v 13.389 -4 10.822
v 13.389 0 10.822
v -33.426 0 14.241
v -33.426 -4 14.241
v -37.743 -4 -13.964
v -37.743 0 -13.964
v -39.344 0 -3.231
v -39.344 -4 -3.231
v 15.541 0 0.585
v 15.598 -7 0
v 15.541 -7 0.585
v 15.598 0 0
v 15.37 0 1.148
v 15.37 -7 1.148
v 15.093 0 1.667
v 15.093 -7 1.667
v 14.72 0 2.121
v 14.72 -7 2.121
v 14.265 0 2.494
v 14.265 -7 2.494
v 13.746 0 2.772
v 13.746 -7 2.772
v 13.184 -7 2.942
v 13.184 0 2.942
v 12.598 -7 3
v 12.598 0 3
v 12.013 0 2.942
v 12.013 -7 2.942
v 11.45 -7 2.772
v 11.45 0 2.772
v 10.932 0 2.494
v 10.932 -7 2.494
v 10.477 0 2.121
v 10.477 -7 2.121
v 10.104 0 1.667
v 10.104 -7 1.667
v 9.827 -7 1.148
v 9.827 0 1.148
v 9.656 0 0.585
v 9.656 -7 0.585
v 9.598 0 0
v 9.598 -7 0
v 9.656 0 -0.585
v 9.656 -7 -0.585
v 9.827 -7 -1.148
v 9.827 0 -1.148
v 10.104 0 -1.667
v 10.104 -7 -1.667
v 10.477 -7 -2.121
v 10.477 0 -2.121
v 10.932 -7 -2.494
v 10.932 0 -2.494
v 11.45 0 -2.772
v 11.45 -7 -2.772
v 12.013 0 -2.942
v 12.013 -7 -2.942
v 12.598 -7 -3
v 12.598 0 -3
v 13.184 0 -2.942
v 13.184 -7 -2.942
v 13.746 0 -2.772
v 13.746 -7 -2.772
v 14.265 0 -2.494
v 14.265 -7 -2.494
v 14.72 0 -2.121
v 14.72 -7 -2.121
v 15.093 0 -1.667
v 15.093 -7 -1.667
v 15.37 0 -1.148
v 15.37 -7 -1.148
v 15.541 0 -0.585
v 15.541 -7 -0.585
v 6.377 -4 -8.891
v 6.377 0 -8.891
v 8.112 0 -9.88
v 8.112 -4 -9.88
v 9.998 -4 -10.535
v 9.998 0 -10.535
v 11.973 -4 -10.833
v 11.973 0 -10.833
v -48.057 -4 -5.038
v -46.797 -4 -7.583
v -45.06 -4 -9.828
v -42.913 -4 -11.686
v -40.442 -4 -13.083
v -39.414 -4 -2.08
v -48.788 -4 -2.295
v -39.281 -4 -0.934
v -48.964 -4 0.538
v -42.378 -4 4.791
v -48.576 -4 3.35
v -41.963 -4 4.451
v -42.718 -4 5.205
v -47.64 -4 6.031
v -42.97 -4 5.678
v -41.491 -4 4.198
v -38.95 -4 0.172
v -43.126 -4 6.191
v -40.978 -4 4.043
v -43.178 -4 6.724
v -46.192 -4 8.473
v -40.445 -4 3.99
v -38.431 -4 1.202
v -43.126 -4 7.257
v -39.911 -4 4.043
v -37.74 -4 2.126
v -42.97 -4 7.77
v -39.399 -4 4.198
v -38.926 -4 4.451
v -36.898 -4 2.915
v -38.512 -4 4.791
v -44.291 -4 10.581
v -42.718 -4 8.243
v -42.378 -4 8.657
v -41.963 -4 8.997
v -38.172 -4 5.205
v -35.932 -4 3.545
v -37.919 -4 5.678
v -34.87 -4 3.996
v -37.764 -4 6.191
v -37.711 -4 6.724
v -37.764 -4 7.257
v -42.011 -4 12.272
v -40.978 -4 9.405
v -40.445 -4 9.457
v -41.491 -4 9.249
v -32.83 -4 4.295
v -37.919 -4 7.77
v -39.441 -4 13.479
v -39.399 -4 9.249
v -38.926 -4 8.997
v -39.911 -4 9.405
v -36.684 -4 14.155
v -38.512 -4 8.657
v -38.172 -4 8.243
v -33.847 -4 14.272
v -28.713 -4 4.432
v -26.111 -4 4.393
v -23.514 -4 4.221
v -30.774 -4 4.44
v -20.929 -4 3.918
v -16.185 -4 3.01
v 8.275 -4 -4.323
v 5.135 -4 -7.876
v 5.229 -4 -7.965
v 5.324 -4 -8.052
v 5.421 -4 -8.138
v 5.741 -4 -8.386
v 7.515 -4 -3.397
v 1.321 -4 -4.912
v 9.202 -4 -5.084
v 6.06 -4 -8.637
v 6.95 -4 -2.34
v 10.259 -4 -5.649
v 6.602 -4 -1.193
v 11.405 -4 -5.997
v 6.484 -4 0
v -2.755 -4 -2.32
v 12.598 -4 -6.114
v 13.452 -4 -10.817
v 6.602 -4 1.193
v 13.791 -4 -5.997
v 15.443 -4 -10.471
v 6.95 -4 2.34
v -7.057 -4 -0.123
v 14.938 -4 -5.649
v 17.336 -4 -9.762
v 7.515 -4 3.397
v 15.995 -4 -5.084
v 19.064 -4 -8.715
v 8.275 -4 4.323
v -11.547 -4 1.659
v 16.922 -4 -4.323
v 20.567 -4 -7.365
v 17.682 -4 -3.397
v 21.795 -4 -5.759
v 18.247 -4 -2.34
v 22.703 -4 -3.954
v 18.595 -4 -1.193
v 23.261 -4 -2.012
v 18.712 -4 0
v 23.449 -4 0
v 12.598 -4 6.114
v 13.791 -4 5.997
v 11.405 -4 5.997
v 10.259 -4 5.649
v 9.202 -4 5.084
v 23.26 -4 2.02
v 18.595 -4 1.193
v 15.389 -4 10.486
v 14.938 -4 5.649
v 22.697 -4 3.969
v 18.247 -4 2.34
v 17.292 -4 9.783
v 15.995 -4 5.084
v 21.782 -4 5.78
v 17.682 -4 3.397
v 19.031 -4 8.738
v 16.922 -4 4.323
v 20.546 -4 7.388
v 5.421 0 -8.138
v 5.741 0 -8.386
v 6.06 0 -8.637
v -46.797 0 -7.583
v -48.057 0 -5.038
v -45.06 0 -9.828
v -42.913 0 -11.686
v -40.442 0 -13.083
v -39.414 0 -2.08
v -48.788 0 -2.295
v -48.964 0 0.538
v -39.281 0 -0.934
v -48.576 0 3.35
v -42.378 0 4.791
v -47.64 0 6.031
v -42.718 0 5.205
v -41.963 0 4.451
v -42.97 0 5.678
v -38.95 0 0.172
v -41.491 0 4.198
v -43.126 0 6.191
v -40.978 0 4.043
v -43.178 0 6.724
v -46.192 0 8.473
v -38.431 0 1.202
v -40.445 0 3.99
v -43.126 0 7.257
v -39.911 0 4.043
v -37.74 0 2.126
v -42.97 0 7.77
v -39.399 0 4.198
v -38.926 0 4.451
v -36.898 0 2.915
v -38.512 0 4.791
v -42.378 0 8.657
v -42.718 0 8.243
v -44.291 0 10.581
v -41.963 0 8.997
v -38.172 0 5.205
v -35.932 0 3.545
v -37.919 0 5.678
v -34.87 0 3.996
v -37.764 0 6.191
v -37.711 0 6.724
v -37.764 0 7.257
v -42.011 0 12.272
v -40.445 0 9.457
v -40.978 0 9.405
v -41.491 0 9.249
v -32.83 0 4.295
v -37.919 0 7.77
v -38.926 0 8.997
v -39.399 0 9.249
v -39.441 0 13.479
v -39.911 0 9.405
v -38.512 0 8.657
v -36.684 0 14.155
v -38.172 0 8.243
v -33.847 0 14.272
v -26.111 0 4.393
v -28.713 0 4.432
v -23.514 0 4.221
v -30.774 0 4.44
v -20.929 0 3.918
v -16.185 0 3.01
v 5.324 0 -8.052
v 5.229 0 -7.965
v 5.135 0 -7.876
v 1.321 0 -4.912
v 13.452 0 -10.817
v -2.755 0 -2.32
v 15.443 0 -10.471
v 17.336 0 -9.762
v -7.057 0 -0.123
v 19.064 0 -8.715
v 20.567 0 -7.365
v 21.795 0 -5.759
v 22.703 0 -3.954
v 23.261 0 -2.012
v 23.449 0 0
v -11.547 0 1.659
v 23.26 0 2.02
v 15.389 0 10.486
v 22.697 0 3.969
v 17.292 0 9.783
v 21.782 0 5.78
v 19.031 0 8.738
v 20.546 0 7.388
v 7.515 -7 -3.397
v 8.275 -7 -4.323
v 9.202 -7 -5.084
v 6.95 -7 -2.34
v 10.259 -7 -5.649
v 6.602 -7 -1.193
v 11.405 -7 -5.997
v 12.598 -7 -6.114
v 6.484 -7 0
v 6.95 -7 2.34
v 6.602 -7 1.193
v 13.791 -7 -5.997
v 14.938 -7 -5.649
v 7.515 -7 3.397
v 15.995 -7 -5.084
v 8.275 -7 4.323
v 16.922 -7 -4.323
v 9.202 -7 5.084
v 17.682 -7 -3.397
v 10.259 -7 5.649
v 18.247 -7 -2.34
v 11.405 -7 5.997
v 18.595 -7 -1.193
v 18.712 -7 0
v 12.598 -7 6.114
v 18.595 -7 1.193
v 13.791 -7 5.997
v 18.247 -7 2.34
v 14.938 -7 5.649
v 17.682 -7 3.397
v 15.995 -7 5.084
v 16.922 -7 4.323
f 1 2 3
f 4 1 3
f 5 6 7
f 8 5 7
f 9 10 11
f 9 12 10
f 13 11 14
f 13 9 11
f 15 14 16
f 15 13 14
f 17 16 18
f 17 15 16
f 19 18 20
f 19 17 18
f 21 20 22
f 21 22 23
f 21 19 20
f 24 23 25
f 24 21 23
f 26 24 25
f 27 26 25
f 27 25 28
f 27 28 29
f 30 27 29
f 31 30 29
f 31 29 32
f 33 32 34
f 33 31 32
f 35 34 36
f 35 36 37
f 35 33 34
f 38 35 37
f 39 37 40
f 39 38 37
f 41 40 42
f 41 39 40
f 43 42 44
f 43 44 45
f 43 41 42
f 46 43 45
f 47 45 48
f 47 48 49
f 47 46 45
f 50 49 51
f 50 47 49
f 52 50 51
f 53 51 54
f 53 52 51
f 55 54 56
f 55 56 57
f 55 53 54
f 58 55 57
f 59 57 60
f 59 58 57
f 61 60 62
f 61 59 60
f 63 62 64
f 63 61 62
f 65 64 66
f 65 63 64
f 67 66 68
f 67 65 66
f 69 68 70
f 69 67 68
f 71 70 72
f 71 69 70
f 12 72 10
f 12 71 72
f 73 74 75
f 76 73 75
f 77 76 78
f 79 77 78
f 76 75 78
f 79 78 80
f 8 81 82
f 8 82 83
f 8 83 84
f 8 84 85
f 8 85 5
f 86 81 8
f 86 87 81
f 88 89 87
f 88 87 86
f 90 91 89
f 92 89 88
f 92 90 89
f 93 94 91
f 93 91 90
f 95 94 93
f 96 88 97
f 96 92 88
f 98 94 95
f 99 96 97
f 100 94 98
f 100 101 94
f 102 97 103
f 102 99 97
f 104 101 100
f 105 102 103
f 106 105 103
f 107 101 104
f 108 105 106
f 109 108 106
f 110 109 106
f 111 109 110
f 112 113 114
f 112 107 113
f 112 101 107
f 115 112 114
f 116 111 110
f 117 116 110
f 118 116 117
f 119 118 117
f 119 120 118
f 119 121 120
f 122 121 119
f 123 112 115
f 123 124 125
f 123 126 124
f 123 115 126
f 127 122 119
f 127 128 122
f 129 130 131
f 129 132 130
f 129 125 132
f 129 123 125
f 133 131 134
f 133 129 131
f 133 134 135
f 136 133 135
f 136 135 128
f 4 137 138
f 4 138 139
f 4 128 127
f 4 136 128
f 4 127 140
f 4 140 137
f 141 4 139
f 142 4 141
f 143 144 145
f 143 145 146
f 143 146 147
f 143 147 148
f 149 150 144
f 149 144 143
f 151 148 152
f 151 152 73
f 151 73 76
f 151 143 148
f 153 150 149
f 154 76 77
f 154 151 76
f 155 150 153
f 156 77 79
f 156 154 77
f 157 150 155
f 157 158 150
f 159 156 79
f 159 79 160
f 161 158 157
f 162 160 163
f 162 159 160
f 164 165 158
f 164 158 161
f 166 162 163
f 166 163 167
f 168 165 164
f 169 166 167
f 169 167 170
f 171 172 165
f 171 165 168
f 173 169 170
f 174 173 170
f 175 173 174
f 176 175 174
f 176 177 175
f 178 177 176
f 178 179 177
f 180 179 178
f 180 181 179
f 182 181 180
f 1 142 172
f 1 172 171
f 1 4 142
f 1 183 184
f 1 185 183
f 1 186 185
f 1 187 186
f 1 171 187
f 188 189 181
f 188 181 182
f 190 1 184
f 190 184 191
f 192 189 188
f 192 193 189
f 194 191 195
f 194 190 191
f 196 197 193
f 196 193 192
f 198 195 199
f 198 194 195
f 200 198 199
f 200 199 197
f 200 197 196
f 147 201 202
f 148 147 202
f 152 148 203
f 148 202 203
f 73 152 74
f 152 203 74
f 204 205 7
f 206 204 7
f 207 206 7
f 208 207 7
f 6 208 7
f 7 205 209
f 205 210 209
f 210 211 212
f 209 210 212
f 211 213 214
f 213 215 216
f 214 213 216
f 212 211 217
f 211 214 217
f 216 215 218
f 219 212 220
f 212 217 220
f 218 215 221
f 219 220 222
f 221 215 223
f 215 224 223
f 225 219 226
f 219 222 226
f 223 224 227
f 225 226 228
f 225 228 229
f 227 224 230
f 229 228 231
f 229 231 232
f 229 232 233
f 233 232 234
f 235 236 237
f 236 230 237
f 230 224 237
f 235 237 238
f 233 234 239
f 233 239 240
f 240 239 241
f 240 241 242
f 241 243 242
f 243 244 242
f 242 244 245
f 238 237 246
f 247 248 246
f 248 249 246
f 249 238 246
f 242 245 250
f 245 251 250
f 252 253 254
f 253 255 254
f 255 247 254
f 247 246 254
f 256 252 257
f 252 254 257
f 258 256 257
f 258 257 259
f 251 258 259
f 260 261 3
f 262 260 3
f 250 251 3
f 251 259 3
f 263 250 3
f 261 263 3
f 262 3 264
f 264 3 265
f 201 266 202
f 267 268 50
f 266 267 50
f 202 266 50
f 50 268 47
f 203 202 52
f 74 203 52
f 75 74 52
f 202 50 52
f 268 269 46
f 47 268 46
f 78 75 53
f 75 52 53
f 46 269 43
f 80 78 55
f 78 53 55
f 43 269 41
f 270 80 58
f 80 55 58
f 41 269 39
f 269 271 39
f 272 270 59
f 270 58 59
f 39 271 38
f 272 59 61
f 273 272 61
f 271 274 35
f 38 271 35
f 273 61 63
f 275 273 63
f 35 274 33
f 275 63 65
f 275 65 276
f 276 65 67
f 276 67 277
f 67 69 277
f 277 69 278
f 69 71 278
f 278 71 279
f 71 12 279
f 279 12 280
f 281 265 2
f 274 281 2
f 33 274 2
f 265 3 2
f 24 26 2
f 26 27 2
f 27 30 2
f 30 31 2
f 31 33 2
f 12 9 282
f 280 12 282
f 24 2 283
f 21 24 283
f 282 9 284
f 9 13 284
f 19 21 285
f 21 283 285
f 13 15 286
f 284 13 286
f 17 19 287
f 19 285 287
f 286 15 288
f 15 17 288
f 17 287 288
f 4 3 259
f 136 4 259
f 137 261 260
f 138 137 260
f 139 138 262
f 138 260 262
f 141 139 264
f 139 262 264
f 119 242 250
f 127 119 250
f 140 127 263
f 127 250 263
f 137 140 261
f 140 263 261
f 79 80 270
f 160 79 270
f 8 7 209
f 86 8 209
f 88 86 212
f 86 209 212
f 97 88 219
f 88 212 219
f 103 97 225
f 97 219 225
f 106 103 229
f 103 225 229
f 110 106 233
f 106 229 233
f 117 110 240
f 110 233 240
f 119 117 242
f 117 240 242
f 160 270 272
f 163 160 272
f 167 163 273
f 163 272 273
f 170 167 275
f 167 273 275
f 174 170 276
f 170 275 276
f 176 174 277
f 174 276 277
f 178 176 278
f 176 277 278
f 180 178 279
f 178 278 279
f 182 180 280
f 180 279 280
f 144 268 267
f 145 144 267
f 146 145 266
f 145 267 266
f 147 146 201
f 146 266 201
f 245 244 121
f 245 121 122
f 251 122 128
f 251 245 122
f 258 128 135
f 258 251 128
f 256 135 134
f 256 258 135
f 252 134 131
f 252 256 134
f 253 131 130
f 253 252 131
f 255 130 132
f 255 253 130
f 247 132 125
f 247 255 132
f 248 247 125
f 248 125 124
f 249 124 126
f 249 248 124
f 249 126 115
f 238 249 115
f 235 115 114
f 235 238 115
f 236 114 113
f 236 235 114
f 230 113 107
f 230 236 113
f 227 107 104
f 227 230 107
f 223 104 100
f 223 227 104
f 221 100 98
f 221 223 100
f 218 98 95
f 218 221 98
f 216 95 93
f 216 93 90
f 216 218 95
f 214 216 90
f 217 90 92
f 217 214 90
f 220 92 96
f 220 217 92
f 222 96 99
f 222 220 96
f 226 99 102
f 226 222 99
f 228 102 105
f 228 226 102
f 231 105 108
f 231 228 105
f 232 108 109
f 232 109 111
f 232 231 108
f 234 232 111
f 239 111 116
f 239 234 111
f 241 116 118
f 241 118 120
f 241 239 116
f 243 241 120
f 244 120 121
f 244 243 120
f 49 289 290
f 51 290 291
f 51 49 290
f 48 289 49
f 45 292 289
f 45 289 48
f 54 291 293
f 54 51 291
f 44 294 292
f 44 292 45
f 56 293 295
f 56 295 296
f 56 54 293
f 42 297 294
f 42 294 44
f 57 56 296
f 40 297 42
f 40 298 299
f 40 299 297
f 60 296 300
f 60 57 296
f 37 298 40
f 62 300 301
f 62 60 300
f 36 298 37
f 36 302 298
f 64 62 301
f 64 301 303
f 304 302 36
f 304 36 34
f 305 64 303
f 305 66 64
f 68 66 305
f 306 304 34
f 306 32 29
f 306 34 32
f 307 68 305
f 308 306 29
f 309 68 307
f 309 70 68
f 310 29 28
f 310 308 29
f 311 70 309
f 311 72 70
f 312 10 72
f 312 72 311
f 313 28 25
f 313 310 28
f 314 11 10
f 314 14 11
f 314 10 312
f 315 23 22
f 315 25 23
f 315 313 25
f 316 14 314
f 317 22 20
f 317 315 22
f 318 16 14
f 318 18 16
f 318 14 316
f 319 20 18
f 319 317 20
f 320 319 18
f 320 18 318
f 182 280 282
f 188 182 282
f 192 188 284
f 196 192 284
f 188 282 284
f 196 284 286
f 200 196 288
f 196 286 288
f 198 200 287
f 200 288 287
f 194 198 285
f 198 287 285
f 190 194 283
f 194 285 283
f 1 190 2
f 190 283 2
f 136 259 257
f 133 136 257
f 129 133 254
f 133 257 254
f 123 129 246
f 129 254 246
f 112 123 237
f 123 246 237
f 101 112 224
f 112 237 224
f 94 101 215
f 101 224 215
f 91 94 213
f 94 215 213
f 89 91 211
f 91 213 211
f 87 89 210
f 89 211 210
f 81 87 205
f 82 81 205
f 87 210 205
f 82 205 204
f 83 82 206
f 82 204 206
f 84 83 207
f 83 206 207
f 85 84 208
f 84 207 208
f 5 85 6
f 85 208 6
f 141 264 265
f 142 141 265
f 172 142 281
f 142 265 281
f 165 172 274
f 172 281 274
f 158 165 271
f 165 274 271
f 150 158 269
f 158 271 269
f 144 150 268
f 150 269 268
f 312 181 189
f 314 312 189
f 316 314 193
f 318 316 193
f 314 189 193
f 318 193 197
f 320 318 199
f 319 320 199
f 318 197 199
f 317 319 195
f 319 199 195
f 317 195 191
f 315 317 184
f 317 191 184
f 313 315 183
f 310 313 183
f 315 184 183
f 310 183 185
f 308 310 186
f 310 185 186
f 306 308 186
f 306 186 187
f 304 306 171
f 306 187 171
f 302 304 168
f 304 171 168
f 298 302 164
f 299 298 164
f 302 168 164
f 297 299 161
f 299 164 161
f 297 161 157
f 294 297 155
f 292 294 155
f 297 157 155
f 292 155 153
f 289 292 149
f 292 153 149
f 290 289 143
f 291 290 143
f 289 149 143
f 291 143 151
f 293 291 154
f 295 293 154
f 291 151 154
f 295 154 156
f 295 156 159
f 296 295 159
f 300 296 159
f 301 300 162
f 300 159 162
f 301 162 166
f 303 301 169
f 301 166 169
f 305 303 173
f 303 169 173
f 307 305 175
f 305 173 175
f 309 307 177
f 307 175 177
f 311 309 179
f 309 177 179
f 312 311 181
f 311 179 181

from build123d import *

# Parameters (mm, degrees)
F0_R     = 2.733615219
F0_R_2   = 3
F1_DEPTH = 4
F2_R     = 6.1140658309
F2_R_2   = 3
F3_DEPTH = 3


with BuildPart() as f1:
    # F0 (on Front) → F1 (new body)
    with BuildSketch(Plane.XZ):
        with BuildLine():
            ThreePointArc((-20.9291024725, 3.9184624391), (-25.5731023406, 11.0220372274), (-33.4257613217, 14.2412384443))
            Line((-33.4257613217, 14.2412384443), (-33.8473095456, 14.2720264872))
            ThreePointArc((-33.8473095456, 14.2720264872), (-48.8397789722, 1.9540051753), (-37.7431354391, -13.9636671057))
            Line((-37.7431354391, -13.9636671057), (-39.344081143, -3.2314471709))
            ThreePointArc((-39.344081143, -3.2314471709), (-38.4309864787, 1.2020468529), (-34.8697970186, 3.9962445472))
            ThreePointArc((-34.8697970186, 3.9962445472), (-31.8036791498, 4.3867256224), (-28.7131243857, 4.4317312401))
            ThreePointArc((-28.7131243857, 4.4317312401), (-24.811331448, 4.3234463104), (-20.9291024725, 3.9184624391))
        make_face()
        with Locations((-40.4446981847, 6.723803468)):
            Circle(F0_R, mode=Mode.SUBTRACT)
        with BuildLine():
            ThreePointArc((5.1346311332, -7.8763348549), (2.6715056736, 4.3819848217), (13.3886933806, 10.8221149428))
            Line((13.3886933806, 10.8221149428), (-33.4257613217, 14.2412384443))
            ThreePointArc((-33.4257613217, 14.2412384443), (-25.5731023406, 11.0220372274), (-20.9291024725, 3.9184624391))
            ThreePointArc((-20.9291024725, 3.9184624391), (-7.0573737231, -0.1230384341), (5.1346311332, -7.8763348549))
        make_face()
        with BuildLine():
            ThreePointArc((13.4524496929, -10.8172695714), (20.5673366745, -7.3645945031), (23.4492335658, 0))
            ThreePointArc((23.4492335658, 0), (20.5456038096, 7.3880417001), (13.3886933806, 10.8221149428))
            ThreePointArc((13.3886933806, 10.8221149428), (2.6715056736, 4.3819848217), (5.1346311332, -7.8763348549))
            ThreePointArc((5.1346311332, -7.8763348549), (5.2764555881, -8.0083454106), (5.4206145263, -8.137802598))
            ThreePointArc((5.4206145263, -8.137802598), (5.901055097, -8.5116123819), (6.3773961579, -8.8906322891))
            ThreePointArc((6.3773961579, -8.8906322891), (9.0400253079, -10.2509332643), (11.972827524, -10.8328988092))
            Line((11.972827524, -10.8328988092), (13.4524496929, -10.8172695714))
        make_face()
        with Locations((12.5982933263, 0)):
            Circle(F0_R_2, mode=Mode.SUBTRACT)
    extrude(amount=F1_DEPTH)

    # F2 (on face) → F3 (join)
    with BuildSketch(Plane.XZ.offset(4)):
        with Locations((12.5982933263, 0)):
            Circle(F2_R)
        with Locations((12.5982933263, 0)):
            Circle(F2_R_2, mode=Mode.SUBTRACT)
    extrude(amount=F3_DEPTH)


solid = f1.part
